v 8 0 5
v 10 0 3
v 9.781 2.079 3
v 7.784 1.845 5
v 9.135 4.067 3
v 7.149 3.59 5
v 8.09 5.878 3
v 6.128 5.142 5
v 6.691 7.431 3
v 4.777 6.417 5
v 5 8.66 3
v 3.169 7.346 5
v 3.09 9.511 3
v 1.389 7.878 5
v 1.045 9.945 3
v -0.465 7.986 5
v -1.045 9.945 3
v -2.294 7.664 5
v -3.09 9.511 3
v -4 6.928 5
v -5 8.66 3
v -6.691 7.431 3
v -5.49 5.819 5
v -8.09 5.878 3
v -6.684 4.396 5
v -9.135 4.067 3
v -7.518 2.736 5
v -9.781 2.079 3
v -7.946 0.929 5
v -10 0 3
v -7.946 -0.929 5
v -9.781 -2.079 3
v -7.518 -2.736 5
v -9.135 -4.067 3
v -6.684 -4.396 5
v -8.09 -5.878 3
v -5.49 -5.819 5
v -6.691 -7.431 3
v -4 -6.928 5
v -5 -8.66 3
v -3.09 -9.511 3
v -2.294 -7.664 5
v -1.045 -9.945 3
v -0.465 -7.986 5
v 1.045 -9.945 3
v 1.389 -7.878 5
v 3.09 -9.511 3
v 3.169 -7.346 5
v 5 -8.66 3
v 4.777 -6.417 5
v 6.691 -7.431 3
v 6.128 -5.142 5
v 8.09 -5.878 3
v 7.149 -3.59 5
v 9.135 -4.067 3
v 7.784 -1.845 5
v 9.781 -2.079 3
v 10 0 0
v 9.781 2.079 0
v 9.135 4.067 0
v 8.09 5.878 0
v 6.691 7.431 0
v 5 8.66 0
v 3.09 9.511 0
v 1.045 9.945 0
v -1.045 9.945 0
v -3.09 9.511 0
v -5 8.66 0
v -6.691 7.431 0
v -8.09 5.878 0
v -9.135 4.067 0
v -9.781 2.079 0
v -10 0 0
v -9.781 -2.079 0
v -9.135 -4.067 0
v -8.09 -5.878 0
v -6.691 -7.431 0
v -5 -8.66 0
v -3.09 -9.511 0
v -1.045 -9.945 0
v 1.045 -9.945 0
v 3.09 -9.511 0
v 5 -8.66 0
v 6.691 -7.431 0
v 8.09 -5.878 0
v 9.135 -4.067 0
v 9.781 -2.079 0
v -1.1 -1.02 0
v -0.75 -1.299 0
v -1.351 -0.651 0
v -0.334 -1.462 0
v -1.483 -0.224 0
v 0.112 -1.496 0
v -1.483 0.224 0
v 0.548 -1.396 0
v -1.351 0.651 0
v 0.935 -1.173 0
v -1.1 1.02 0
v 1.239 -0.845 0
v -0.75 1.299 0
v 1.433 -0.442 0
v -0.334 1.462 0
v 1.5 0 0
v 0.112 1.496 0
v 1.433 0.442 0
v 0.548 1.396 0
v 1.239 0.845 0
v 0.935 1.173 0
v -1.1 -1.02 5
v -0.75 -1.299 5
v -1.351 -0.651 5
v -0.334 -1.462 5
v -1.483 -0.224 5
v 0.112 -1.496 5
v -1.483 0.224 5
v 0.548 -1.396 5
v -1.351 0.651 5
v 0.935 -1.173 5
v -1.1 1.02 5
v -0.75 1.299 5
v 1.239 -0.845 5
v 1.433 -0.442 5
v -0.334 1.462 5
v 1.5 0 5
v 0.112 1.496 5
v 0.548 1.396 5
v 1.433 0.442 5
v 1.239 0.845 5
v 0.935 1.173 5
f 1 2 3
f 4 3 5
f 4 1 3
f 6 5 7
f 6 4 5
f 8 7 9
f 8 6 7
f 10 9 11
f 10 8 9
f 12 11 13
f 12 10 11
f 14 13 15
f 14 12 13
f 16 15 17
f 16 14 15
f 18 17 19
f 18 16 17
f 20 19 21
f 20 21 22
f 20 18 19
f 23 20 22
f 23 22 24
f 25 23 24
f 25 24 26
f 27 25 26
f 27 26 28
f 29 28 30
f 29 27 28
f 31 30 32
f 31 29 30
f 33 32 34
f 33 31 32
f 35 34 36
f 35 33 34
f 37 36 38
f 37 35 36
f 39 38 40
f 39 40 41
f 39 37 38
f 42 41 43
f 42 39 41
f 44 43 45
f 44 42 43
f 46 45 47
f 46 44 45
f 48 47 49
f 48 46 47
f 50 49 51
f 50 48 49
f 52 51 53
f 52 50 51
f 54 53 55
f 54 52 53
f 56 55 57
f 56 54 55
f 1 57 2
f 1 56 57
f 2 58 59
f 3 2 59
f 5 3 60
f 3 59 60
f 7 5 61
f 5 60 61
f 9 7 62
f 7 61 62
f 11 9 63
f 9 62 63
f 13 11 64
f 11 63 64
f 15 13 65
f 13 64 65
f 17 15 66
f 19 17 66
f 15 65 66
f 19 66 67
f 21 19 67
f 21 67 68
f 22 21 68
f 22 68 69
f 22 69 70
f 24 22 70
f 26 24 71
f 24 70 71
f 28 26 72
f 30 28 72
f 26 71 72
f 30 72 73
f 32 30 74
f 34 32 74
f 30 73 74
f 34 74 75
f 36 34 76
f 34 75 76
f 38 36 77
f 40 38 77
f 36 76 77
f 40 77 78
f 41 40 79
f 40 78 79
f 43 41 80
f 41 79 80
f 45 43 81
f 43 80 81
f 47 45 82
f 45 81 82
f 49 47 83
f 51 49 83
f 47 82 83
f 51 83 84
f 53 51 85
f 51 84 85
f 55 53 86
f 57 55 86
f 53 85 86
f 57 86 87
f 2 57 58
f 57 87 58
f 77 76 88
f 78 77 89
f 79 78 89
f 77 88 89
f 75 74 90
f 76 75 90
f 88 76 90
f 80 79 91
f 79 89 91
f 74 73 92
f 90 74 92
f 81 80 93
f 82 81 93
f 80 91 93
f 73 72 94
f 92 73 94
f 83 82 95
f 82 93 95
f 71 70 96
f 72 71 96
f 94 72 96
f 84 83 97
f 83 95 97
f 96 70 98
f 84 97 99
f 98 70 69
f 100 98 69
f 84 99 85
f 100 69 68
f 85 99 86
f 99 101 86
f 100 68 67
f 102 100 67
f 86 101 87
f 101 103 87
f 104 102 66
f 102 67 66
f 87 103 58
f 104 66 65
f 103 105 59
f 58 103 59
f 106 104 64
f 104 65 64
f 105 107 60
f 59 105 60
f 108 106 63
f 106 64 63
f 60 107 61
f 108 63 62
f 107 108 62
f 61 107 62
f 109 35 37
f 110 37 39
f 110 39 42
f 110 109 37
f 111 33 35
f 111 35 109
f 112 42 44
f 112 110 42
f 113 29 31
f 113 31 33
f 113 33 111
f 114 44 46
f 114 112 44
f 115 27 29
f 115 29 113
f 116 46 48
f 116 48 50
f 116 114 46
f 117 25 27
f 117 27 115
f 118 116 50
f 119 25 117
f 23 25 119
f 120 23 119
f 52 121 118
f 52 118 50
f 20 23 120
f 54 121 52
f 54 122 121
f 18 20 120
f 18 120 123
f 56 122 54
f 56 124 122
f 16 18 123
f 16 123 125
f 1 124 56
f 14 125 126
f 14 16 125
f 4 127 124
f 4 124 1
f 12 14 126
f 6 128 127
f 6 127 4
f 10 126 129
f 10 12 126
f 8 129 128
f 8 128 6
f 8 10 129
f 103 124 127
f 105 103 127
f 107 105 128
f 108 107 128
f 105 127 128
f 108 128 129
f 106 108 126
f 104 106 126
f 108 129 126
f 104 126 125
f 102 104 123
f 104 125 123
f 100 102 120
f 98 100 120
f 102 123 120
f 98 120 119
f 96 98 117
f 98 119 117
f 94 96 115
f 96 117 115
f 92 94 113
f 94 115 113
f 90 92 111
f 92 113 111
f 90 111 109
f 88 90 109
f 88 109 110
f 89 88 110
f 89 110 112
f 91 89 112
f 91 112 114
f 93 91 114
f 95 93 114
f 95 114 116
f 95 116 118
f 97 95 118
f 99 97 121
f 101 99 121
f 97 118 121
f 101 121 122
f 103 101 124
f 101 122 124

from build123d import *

# Parameters (mm, degrees)
SKETCH1_R           = 10
BOSS_EXTRUDE1_DEPTH = 5
CHAMFER1_SIZE       = 2
SKETCH2_R           = 1.5
CUT_EXTRUDE1_DEPTH  = 5


with BuildPart() as part:
    # Sketch1 → Boss-Extrude1 (new body)
    with BuildSketch(Plane.XY):
        Circle(SKETCH1_R)
    extrude(amount=BOSS_EXTRUDE1_DEPTH)

    # Chamfer1
    chamfer1_edges = [part.edges().sort_by_distance(p)[0] for p in [
        (-10, 0, 5),
    ]]
    chamfer(chamfer1_edges, length=CHAMFER1_SIZE)

    # Sketch2 → Cut-Extrude1 (cut)
    with BuildSketch(Plane.XY.offset(5)):
        Circle(SKETCH2_R)
    extrude(amount=-CUT_EXTRUDE1_DEPTH, mode=Mode.SUBTRACT)


solid = part.part
